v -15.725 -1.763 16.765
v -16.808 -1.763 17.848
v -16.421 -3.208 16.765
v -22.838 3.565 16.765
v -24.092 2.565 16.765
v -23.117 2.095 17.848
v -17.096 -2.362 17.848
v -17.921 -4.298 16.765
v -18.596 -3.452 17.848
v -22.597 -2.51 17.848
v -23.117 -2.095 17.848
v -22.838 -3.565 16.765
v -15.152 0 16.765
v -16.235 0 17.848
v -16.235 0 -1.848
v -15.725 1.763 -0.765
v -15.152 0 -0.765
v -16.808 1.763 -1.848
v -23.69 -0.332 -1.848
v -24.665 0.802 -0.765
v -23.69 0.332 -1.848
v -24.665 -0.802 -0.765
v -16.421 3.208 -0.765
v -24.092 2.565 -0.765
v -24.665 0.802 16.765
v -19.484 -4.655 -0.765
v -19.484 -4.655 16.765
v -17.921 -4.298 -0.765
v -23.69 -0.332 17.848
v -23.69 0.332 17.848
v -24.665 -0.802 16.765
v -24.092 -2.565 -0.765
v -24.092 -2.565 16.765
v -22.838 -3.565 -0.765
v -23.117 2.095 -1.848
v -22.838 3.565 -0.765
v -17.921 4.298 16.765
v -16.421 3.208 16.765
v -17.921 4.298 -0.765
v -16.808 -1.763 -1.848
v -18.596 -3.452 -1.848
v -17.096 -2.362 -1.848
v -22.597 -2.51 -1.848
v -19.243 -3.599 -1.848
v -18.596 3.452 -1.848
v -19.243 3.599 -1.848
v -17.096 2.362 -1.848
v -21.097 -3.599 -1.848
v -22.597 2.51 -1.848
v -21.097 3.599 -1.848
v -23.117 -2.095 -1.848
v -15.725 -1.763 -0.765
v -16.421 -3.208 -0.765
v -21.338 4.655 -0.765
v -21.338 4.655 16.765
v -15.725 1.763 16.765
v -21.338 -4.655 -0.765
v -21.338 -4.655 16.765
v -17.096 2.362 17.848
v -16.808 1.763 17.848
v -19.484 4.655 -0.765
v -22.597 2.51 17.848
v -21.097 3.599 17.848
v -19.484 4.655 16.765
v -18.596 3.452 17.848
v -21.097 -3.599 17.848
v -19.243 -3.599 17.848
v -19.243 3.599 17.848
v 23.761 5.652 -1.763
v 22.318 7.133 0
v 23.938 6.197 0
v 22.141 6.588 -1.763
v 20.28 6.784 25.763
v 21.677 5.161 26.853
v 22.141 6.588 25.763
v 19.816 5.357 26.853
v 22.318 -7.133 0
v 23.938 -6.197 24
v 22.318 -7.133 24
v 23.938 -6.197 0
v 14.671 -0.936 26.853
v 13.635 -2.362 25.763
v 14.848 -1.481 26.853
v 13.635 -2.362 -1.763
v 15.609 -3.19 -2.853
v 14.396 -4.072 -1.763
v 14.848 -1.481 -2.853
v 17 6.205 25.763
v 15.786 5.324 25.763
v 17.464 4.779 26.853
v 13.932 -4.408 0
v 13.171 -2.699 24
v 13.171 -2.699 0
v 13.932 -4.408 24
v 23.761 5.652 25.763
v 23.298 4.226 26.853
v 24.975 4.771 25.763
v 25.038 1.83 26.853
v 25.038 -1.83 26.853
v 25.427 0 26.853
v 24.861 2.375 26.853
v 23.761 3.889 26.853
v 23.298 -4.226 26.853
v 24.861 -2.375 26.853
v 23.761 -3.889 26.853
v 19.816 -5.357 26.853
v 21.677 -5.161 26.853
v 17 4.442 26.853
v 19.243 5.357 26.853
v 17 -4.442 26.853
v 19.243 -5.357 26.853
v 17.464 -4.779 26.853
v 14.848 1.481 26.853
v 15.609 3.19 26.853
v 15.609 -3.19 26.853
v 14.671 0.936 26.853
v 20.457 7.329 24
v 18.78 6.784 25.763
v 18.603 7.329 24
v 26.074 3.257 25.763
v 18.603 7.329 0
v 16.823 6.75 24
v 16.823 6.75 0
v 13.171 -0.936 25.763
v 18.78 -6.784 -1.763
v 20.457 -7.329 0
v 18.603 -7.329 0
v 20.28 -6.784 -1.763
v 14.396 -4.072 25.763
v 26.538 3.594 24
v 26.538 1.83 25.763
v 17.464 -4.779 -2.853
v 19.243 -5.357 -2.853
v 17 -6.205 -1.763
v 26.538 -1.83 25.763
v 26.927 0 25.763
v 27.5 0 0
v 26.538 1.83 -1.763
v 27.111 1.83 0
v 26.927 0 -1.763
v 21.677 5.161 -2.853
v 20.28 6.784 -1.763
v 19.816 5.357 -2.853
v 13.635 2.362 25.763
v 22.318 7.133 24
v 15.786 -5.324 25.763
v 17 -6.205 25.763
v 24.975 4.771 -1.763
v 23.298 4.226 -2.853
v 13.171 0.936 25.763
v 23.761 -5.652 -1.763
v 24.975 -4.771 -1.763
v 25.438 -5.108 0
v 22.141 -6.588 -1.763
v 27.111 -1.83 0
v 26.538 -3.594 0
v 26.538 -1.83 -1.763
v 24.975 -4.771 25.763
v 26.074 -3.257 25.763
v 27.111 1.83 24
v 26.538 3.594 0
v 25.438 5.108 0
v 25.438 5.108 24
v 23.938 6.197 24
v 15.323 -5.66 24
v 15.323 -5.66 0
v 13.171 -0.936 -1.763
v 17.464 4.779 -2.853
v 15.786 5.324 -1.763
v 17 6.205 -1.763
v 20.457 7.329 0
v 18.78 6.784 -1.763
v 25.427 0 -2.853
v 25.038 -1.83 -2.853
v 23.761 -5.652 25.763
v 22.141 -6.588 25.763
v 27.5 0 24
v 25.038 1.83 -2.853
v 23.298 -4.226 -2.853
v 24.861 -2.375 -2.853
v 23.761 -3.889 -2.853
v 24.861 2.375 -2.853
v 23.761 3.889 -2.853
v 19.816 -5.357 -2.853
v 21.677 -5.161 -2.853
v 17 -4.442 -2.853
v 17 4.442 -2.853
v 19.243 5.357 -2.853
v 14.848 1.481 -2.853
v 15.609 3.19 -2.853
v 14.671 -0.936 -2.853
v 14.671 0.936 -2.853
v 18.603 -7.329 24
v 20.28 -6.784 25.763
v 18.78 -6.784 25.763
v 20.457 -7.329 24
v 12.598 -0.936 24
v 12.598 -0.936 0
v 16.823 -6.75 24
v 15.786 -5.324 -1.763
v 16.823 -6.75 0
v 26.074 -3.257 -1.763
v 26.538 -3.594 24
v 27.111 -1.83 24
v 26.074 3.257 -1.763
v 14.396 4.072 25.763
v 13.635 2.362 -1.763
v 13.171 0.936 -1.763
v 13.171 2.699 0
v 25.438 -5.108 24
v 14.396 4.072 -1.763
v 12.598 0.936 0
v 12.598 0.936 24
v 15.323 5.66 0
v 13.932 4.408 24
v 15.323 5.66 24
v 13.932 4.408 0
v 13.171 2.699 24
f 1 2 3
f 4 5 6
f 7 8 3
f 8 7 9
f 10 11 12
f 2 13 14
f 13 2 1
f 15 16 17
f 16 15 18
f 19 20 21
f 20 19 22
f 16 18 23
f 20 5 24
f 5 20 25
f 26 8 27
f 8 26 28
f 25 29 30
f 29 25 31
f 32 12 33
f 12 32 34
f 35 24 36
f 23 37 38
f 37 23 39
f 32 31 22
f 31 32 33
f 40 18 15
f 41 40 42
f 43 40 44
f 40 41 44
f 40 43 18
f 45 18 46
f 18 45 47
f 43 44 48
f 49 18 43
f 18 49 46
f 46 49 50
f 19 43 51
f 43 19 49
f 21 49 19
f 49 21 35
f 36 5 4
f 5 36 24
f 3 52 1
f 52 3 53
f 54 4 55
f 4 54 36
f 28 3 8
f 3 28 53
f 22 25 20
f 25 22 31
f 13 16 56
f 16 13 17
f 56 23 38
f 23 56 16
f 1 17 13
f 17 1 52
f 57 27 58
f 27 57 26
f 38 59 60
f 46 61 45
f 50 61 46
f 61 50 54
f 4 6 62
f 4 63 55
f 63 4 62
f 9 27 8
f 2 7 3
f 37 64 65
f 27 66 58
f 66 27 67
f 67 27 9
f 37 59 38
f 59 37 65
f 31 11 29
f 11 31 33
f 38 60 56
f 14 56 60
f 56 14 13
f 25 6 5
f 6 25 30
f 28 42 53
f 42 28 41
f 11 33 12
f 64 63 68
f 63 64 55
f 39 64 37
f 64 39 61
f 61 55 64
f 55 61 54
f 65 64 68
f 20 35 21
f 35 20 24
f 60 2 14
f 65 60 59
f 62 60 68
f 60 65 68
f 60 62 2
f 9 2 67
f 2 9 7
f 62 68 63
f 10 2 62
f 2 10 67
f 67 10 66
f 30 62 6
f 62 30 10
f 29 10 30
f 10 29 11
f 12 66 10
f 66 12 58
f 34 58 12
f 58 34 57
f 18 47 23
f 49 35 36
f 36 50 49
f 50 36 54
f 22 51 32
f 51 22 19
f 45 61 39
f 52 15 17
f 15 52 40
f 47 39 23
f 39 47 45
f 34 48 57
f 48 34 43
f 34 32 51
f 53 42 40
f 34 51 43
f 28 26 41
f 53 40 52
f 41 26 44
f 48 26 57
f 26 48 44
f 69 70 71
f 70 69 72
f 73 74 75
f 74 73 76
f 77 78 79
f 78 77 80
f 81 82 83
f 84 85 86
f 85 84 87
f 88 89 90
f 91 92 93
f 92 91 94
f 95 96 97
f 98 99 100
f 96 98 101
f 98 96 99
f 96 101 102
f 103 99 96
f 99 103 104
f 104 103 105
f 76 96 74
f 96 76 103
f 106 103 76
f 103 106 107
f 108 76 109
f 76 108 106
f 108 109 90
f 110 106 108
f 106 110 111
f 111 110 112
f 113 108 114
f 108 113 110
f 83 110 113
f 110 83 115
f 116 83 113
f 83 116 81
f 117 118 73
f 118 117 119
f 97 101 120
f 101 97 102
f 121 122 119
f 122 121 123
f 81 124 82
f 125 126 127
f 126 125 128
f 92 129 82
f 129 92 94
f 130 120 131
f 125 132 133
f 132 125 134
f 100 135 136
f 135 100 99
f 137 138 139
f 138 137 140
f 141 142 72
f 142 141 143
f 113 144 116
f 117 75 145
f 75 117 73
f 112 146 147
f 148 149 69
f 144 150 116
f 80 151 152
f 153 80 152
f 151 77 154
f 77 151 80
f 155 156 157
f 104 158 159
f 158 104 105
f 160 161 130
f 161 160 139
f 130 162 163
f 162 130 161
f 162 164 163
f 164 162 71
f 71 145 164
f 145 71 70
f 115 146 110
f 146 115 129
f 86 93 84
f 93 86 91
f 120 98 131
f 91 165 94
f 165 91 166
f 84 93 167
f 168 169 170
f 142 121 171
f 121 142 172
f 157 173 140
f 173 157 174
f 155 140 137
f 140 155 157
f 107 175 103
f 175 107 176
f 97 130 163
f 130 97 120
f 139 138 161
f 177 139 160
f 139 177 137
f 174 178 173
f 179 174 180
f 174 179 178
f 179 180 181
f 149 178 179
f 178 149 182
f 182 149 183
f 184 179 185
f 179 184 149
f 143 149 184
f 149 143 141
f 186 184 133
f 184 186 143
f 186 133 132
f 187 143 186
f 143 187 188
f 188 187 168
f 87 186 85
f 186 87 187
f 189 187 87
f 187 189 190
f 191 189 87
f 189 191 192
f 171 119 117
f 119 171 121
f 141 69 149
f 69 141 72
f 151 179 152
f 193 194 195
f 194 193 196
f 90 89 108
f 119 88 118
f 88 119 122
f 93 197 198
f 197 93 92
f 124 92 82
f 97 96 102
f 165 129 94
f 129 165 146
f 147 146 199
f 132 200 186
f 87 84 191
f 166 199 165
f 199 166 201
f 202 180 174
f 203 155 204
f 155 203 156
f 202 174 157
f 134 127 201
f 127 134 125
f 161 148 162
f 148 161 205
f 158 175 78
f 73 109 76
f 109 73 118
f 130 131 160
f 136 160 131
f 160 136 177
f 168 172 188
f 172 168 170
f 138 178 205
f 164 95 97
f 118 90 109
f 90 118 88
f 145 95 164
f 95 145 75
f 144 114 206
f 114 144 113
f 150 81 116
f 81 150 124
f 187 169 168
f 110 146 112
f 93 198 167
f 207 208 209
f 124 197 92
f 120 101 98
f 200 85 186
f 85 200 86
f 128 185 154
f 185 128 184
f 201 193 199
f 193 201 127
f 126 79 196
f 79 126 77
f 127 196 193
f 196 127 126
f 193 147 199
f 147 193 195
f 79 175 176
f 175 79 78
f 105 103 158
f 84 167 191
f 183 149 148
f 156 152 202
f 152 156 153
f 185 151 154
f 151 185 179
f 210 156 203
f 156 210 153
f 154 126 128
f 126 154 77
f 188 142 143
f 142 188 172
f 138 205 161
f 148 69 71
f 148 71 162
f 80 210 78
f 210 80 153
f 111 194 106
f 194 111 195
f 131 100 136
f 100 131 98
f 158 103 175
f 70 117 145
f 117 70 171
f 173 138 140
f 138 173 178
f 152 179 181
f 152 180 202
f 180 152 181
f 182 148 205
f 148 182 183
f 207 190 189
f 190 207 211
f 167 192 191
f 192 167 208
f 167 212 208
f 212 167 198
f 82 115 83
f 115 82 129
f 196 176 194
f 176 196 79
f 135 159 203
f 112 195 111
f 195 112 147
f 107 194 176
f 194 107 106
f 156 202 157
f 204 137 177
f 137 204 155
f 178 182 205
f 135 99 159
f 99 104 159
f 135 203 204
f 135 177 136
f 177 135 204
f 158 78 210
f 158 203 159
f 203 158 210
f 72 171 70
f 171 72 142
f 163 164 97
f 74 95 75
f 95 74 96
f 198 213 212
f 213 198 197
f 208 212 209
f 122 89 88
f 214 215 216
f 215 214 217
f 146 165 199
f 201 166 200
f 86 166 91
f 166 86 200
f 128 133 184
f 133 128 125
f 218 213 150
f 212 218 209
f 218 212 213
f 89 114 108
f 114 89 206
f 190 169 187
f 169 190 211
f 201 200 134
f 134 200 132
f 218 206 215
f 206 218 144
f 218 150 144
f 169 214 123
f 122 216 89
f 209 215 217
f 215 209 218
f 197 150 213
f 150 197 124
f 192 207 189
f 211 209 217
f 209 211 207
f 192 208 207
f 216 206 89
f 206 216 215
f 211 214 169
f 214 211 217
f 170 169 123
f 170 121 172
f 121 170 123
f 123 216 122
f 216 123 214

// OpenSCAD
// file: ../../lib/shapes/rounded_cylinder.scad
// lib/shapes/rounded_cylinder.scad

/**
 * Creates a rounded cylinder with the specified height, diameter, and radius.
 *
 * @param height The height of the cylinder.
 * @param diameter The diameter of the cylinder.
 * @param radius The radius of the rounding.
 */
module shapeRoundedCylinder(height = 20, diameter = 10, radius = 2) {
    minkowski() {
        cylinder(h = height - radius*2, d = diameter - radius*2);
        sphere(radius);
    }
}
// main file
// tests/shapes/test_rounded_cylinder.scad

use <../../lib/shapes/rounded_cylinder.scad>

module testRoundedCylinder() {
    translate([-20, 0, 0])
    shapeRoundedCylinder(height = 20, diameter = 10, radius = 2);

    translate([20, 0, 0])
    shapeRoundedCylinder(height = 30, diameter = 15, radius = 3);
}

// Run tests
testRoundedCylinder();
